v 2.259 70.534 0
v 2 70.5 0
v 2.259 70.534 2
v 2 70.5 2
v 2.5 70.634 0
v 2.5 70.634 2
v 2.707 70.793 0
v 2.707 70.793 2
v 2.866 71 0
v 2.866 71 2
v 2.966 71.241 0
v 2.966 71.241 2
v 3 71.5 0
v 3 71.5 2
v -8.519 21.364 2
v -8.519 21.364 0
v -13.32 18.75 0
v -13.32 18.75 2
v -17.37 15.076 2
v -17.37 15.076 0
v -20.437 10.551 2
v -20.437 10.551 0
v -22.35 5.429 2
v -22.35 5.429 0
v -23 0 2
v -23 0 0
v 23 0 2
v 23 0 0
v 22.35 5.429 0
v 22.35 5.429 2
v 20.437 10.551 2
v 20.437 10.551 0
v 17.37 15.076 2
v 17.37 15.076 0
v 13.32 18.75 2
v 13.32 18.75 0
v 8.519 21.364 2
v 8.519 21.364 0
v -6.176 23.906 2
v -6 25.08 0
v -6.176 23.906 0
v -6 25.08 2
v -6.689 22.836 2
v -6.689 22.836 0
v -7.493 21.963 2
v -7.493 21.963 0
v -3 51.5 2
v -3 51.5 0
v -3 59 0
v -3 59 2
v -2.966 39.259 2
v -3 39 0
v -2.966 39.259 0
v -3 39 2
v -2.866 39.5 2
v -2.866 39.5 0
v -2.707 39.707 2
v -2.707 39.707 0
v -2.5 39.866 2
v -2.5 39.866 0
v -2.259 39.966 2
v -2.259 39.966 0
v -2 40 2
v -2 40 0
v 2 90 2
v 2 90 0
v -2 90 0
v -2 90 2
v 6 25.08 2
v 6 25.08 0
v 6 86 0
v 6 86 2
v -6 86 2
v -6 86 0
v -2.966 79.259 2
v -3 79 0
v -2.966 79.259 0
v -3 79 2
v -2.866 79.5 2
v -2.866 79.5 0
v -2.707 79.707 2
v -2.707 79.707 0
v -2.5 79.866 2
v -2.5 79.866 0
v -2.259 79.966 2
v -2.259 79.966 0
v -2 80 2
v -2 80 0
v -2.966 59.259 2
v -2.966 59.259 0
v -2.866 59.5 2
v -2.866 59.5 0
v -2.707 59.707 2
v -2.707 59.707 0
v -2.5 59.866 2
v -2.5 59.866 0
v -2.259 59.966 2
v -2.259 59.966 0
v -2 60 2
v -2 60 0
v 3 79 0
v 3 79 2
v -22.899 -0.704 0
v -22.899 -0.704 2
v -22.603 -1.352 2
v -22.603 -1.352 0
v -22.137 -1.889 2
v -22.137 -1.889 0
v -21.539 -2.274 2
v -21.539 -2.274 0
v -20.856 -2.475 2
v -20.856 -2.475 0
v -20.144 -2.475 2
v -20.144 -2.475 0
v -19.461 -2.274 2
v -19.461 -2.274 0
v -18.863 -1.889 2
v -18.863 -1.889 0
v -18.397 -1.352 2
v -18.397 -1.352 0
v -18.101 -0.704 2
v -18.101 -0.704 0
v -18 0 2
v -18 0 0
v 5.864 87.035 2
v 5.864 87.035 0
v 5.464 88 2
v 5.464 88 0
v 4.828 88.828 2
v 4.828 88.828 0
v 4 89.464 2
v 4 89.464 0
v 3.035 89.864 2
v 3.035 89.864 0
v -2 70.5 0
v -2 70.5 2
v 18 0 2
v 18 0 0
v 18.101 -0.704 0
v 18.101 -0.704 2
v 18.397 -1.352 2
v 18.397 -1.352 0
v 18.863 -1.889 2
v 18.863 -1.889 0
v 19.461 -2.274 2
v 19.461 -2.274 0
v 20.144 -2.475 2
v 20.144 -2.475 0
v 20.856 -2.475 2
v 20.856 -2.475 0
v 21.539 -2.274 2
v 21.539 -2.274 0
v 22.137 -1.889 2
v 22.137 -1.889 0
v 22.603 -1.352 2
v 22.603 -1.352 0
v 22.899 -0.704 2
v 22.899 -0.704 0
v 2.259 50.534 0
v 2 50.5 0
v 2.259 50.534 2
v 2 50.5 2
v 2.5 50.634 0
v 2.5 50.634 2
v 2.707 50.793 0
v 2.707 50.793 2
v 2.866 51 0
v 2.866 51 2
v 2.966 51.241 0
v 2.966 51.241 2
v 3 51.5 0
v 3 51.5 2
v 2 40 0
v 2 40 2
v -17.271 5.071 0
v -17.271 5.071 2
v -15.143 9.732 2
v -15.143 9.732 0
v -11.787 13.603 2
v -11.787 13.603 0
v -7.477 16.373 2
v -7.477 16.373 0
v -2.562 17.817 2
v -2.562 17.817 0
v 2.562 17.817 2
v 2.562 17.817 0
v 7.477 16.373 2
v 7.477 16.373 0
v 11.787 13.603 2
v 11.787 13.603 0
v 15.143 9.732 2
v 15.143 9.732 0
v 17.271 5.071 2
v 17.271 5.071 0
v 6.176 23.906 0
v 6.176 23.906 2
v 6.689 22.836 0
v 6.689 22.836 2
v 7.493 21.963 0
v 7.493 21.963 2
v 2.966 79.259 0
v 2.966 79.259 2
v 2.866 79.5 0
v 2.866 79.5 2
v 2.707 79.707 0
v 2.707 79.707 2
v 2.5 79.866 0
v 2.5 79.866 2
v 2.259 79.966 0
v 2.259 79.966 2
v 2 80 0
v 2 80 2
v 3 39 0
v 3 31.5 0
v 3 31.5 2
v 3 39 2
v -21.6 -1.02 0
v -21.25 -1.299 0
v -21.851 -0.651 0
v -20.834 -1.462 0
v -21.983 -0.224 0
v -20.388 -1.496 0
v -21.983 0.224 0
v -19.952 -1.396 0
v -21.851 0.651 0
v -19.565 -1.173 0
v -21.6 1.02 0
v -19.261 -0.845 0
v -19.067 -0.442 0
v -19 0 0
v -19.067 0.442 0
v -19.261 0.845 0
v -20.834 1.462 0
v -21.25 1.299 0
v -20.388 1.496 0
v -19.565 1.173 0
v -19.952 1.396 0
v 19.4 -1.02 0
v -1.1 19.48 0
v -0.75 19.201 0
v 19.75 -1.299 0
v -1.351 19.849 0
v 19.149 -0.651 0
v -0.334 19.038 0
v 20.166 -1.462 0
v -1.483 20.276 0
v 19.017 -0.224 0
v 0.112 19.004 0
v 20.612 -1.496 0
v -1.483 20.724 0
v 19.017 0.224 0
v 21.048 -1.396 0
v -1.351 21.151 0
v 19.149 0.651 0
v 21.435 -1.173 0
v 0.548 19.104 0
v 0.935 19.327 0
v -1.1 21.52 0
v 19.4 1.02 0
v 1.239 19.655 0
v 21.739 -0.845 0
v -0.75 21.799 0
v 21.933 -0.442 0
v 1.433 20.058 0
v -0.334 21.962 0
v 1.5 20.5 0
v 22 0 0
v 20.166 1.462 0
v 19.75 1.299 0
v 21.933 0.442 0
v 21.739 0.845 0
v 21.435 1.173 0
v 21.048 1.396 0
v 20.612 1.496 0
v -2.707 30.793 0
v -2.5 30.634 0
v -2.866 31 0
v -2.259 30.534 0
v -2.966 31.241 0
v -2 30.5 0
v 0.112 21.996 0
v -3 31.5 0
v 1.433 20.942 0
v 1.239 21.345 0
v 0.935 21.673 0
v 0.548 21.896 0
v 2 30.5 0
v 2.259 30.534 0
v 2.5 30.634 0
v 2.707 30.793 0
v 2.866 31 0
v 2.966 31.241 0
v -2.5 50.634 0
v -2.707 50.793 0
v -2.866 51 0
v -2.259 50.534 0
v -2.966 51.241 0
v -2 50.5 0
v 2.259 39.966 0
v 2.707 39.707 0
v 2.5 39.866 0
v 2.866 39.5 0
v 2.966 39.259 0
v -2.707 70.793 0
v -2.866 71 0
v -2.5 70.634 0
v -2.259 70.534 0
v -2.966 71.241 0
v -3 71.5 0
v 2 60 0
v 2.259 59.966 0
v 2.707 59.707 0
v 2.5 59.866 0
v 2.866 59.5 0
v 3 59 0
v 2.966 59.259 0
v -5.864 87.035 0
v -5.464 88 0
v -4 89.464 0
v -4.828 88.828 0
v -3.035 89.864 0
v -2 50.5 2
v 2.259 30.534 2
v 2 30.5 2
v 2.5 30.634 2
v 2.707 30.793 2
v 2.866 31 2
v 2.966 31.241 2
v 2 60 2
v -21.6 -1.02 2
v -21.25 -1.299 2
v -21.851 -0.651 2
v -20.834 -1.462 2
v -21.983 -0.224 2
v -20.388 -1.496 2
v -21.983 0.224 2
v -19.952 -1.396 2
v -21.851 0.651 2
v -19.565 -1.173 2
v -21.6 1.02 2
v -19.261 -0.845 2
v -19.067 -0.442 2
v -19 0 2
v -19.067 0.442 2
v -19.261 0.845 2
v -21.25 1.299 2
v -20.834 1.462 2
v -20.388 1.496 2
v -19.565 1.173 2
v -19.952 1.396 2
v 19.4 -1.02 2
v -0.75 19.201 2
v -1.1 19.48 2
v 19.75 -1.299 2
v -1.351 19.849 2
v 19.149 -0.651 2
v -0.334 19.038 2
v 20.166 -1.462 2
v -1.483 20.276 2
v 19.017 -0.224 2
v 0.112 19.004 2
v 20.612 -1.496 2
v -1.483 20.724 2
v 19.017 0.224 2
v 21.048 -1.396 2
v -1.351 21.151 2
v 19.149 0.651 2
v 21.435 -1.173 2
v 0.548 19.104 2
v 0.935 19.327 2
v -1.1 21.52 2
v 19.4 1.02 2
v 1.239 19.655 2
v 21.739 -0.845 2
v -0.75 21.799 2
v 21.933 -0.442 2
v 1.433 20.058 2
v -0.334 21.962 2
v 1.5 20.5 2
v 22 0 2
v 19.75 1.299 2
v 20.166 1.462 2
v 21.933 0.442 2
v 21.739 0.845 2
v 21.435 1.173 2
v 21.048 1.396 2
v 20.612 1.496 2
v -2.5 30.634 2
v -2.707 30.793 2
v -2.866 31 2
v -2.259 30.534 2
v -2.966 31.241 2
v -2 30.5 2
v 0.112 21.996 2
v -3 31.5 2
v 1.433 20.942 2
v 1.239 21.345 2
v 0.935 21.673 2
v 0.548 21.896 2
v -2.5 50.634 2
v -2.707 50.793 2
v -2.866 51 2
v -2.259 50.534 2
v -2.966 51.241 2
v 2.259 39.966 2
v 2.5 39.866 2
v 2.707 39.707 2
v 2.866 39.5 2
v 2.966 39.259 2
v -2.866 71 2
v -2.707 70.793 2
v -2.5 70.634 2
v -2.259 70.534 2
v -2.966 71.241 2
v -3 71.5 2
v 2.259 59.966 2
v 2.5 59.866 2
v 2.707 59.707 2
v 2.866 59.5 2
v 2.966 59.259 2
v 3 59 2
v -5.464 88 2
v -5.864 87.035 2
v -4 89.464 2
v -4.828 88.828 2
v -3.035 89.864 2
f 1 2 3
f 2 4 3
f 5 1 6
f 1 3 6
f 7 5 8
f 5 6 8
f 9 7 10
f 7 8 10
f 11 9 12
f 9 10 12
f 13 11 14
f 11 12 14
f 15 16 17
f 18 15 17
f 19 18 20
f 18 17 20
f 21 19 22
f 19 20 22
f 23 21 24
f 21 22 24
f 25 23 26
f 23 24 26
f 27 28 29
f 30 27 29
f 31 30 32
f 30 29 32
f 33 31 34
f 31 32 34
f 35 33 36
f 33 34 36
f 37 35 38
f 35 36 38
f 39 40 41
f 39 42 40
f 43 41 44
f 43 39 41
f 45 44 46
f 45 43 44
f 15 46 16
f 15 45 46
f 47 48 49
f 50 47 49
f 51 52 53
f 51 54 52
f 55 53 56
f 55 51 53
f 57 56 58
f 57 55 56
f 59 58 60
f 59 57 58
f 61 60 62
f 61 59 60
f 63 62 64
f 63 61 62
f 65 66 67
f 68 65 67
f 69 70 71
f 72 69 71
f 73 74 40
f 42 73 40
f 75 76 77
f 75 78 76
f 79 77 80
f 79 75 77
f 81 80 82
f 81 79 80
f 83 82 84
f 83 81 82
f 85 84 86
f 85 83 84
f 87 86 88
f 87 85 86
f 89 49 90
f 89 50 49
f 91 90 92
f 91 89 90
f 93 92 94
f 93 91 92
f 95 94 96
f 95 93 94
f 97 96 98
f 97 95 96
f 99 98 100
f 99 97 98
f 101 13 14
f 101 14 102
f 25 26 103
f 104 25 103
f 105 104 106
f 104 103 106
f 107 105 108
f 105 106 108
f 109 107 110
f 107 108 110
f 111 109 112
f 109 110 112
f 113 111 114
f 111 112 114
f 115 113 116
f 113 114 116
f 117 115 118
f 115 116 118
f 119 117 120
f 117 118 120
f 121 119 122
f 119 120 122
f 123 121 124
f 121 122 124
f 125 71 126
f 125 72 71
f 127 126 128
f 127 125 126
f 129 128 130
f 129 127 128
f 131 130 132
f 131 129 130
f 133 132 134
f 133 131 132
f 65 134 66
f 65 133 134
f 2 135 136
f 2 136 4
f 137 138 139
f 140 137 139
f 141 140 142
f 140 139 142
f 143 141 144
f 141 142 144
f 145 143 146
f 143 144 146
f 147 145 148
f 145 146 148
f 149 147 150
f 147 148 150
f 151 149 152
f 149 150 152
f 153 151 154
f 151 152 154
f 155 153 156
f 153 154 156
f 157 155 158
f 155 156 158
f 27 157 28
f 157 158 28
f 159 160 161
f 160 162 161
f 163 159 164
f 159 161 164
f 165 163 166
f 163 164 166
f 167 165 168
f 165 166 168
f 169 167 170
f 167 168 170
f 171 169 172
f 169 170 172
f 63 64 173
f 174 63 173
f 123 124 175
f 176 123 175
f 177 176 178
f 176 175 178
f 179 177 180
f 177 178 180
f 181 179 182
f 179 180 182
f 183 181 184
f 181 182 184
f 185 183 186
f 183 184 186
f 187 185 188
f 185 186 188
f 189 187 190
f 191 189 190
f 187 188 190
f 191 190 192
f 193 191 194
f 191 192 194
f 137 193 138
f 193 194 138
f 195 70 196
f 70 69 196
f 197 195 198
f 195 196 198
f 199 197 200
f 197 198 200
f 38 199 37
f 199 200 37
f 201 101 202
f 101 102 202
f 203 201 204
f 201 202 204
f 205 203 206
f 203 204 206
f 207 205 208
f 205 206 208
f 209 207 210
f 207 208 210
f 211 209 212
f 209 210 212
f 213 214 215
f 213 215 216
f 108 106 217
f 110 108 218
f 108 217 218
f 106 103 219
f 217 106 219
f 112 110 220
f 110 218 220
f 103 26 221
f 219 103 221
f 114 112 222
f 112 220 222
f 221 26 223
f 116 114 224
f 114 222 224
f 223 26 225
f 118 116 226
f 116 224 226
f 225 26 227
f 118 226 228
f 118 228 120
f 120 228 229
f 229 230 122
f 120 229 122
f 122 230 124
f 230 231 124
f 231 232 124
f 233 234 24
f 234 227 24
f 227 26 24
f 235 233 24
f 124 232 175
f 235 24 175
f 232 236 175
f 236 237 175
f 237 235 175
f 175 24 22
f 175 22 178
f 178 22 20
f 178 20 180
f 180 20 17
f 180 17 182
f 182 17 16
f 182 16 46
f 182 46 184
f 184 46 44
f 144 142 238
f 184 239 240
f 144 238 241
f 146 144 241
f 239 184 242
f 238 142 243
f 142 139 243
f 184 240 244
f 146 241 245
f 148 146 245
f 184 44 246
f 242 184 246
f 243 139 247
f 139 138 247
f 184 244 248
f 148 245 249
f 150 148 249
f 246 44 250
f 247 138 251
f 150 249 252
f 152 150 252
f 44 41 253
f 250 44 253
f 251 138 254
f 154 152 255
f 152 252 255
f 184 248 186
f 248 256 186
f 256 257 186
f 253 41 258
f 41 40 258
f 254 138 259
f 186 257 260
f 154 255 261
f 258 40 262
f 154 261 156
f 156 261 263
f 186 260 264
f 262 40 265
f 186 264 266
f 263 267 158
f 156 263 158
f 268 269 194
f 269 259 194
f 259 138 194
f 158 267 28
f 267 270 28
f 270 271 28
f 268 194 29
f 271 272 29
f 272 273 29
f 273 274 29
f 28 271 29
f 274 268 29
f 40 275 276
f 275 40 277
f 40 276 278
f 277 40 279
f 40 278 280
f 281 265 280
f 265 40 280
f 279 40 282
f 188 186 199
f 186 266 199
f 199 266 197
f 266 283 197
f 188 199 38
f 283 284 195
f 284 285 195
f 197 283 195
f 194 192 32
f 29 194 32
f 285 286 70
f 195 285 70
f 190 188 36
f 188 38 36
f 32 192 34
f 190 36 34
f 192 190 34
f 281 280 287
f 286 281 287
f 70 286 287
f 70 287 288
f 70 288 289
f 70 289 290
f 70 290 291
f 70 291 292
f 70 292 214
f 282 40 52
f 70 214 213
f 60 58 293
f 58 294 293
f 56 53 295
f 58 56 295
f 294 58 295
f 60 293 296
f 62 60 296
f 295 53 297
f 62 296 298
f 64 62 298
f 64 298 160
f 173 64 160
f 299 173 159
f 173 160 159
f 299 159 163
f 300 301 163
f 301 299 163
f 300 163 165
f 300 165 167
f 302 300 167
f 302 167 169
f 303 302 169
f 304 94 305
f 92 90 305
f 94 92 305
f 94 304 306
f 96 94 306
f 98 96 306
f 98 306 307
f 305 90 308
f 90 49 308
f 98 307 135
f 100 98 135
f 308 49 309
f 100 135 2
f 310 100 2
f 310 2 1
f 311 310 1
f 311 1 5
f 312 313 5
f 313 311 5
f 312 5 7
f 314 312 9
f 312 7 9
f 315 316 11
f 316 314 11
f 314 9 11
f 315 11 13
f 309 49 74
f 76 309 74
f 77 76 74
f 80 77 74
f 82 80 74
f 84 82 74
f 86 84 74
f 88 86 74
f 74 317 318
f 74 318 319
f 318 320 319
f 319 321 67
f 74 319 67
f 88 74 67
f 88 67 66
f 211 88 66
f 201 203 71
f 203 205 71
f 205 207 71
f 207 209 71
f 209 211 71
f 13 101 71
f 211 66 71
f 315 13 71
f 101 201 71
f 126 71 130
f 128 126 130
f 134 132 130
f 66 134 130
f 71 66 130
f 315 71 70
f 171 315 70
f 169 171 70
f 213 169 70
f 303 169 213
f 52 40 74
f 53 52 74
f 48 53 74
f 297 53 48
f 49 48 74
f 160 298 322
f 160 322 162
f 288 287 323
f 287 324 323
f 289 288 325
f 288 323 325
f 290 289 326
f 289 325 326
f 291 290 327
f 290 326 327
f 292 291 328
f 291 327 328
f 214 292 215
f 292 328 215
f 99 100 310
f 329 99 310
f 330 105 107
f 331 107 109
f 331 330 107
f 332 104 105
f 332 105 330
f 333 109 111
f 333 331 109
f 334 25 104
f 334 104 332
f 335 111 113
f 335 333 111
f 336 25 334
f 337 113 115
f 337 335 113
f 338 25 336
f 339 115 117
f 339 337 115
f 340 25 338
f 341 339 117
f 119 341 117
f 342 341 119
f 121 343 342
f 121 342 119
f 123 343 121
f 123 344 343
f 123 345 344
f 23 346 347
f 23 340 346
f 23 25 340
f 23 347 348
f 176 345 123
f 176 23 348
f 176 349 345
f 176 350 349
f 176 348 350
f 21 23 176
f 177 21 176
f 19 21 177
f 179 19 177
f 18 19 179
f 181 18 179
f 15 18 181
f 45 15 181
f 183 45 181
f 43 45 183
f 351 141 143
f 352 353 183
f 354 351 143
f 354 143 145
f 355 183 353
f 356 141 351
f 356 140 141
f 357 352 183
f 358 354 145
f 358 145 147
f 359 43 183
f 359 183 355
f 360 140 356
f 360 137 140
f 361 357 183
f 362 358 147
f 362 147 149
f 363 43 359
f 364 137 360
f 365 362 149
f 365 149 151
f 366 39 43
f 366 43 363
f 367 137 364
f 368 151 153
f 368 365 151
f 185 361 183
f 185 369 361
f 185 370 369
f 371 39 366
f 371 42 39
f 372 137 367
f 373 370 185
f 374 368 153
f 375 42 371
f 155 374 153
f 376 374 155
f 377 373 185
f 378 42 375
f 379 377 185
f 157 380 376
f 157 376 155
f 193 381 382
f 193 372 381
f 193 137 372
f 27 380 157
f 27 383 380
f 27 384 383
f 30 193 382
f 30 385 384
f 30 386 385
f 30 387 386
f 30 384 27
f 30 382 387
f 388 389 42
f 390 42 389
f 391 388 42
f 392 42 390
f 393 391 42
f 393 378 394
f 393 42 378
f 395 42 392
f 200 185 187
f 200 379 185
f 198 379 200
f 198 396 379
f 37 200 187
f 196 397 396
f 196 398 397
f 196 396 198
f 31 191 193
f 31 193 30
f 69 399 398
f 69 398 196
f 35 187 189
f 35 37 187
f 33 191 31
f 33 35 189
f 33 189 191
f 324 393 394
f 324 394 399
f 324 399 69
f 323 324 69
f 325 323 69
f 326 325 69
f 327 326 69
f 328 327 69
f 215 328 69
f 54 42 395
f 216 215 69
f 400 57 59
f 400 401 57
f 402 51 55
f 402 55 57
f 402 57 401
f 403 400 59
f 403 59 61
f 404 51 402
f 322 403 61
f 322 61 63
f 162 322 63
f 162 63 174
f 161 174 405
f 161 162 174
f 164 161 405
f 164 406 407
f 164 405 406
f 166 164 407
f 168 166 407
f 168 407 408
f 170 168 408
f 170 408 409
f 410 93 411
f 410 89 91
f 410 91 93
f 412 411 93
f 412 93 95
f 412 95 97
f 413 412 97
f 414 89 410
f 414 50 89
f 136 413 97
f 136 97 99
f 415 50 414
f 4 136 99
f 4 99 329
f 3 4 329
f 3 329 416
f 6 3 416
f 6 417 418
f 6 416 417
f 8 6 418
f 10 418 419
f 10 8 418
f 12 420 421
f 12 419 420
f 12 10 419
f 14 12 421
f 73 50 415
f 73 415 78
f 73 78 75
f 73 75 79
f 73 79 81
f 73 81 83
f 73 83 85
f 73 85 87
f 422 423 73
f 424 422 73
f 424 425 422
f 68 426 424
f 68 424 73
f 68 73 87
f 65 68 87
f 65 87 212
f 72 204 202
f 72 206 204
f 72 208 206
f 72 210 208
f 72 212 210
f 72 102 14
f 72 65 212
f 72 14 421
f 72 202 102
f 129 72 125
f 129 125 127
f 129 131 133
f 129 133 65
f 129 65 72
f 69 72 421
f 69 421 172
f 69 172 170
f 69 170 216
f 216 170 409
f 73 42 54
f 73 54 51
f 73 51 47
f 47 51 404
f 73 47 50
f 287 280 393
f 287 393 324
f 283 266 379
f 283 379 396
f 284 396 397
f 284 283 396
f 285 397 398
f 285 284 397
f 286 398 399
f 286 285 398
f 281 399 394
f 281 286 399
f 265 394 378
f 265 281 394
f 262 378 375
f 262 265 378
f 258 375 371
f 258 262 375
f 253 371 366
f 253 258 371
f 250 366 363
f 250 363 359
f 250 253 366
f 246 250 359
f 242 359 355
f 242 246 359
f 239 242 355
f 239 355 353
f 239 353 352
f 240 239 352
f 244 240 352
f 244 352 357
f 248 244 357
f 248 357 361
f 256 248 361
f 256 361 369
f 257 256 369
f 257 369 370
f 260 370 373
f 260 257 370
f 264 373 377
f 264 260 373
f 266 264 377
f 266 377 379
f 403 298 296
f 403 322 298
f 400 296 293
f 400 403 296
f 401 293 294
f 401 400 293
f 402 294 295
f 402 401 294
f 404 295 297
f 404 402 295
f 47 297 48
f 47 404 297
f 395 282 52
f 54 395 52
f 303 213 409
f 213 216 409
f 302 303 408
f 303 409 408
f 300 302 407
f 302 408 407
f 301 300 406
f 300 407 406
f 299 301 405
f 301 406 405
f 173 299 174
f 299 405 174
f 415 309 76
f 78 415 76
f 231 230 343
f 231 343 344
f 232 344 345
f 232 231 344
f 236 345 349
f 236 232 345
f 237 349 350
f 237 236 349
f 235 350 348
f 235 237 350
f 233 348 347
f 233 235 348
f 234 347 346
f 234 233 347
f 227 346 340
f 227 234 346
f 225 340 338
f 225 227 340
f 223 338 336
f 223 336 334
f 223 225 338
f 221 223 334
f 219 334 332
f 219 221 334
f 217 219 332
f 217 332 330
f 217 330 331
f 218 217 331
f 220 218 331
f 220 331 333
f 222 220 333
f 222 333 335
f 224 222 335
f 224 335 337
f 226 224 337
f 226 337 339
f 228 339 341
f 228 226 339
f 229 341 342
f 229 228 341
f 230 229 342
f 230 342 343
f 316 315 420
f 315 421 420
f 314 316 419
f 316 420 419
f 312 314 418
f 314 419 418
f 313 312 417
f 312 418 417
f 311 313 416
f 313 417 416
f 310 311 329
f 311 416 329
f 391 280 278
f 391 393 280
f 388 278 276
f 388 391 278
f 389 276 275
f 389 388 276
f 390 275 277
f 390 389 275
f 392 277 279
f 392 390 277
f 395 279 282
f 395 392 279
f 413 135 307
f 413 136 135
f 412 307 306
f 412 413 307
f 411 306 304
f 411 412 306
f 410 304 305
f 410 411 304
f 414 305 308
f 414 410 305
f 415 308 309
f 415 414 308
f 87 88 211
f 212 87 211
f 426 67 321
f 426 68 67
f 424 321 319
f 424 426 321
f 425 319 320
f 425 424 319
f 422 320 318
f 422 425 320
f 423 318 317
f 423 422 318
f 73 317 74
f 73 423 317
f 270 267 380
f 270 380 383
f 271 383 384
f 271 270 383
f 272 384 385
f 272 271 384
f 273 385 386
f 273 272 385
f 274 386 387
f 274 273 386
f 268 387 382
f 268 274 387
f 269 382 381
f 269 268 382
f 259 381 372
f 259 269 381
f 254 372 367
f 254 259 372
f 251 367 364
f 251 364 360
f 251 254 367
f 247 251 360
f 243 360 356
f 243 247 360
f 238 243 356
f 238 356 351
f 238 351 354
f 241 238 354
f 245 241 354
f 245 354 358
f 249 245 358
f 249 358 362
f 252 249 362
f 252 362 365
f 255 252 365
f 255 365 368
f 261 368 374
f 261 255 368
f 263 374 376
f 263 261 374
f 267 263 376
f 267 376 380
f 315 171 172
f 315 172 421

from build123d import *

# Parameters (mm, degrees)
SKETCH_1_W      = 6
SKETCH_1_H      = 9.5
SKETCH_1_R      = 1.5
EXTRUDE_1_DEPTH = 2
FILLET_1_R      = 1
FILLET_2_R      = 4


with BuildPart() as part:
    # 草图1 → 凸台-拉伸1 (new body)
    with BuildSketch(Plane.XY):
        with BuildLine():
            Line((6, 22.203603311), (6, 90))
            Line((6, 90), (-6, 90))
            Line((-6, 90), (-6, 22.203603311))
            ThreePointArc((-6, 22.203603311), (-18.261982368, 13.982131454), (-23, 0))
            ThreePointArc((-23, 0), (-20.5, -2.5), (-18, 0))
            ThreePointArc((-18, 0), (0, 18), (18, 0))
            ThreePointArc((18, 0), (20.5, -2.5), (23, 0))
            ThreePointArc((23, 0), (18.261982368, 13.982131454), (6, 22.203603311))
        make_face()
        with Locations((0, 35.25)):
            Rectangle(SKETCH_1_W, SKETCH_1_H, mode=Mode.SUBTRACT)
        with Locations((0, 55.25)):
            Rectangle(SKETCH_1_W, SKETCH_1_H, mode=Mode.SUBTRACT)
        with Locations((0, 75.25)):
            Rectangle(SKETCH_1_W, SKETCH_1_H, mode=Mode.SUBTRACT)
        with Locations((0, 20.5)):
            Circle(SKETCH_1_R, mode=Mode.SUBTRACT)
        with Locations((20.5, 0)):
            Circle(SKETCH_1_R, mode=Mode.SUBTRACT)
        with Locations((-20.5, 0)):
            Circle(SKETCH_1_R, mode=Mode.SUBTRACT)
    extrude(amount=EXTRUDE_1_DEPTH)

    # 圆角1
    fillet_1_edges = [part.edges().sort_by_distance(p)[0] for p in [
        (3, 30.5, 1),
        (3, 40, 1),
        (-3, 40, 1),
        (-3, 30.5, 1),
        (3, 50.5, 1),
        (3, 60, 1),
        (-3, 60, 1),
        (-3, 50.5, 1),
        (-3, 80, 1),
        (-3, 70.5, 1),
        (3, 70.5, 1),
        (3, 80, 1),
    ]]
    fillet(fillet_1_edges, radius=FILLET_1_R)

    # 圆角2
    fillet_2_edges = [part.edges().sort_by_distance(p)[0] for p in [
        (-6, 22.203603311, 1),
        (-6, 90, 1),
        (6, 90, 1),
        (6, 22.203603311, 1),
    ]]
    fillet(fillet_2_edges, radius=FILLET_2_R)


solid = part.part
